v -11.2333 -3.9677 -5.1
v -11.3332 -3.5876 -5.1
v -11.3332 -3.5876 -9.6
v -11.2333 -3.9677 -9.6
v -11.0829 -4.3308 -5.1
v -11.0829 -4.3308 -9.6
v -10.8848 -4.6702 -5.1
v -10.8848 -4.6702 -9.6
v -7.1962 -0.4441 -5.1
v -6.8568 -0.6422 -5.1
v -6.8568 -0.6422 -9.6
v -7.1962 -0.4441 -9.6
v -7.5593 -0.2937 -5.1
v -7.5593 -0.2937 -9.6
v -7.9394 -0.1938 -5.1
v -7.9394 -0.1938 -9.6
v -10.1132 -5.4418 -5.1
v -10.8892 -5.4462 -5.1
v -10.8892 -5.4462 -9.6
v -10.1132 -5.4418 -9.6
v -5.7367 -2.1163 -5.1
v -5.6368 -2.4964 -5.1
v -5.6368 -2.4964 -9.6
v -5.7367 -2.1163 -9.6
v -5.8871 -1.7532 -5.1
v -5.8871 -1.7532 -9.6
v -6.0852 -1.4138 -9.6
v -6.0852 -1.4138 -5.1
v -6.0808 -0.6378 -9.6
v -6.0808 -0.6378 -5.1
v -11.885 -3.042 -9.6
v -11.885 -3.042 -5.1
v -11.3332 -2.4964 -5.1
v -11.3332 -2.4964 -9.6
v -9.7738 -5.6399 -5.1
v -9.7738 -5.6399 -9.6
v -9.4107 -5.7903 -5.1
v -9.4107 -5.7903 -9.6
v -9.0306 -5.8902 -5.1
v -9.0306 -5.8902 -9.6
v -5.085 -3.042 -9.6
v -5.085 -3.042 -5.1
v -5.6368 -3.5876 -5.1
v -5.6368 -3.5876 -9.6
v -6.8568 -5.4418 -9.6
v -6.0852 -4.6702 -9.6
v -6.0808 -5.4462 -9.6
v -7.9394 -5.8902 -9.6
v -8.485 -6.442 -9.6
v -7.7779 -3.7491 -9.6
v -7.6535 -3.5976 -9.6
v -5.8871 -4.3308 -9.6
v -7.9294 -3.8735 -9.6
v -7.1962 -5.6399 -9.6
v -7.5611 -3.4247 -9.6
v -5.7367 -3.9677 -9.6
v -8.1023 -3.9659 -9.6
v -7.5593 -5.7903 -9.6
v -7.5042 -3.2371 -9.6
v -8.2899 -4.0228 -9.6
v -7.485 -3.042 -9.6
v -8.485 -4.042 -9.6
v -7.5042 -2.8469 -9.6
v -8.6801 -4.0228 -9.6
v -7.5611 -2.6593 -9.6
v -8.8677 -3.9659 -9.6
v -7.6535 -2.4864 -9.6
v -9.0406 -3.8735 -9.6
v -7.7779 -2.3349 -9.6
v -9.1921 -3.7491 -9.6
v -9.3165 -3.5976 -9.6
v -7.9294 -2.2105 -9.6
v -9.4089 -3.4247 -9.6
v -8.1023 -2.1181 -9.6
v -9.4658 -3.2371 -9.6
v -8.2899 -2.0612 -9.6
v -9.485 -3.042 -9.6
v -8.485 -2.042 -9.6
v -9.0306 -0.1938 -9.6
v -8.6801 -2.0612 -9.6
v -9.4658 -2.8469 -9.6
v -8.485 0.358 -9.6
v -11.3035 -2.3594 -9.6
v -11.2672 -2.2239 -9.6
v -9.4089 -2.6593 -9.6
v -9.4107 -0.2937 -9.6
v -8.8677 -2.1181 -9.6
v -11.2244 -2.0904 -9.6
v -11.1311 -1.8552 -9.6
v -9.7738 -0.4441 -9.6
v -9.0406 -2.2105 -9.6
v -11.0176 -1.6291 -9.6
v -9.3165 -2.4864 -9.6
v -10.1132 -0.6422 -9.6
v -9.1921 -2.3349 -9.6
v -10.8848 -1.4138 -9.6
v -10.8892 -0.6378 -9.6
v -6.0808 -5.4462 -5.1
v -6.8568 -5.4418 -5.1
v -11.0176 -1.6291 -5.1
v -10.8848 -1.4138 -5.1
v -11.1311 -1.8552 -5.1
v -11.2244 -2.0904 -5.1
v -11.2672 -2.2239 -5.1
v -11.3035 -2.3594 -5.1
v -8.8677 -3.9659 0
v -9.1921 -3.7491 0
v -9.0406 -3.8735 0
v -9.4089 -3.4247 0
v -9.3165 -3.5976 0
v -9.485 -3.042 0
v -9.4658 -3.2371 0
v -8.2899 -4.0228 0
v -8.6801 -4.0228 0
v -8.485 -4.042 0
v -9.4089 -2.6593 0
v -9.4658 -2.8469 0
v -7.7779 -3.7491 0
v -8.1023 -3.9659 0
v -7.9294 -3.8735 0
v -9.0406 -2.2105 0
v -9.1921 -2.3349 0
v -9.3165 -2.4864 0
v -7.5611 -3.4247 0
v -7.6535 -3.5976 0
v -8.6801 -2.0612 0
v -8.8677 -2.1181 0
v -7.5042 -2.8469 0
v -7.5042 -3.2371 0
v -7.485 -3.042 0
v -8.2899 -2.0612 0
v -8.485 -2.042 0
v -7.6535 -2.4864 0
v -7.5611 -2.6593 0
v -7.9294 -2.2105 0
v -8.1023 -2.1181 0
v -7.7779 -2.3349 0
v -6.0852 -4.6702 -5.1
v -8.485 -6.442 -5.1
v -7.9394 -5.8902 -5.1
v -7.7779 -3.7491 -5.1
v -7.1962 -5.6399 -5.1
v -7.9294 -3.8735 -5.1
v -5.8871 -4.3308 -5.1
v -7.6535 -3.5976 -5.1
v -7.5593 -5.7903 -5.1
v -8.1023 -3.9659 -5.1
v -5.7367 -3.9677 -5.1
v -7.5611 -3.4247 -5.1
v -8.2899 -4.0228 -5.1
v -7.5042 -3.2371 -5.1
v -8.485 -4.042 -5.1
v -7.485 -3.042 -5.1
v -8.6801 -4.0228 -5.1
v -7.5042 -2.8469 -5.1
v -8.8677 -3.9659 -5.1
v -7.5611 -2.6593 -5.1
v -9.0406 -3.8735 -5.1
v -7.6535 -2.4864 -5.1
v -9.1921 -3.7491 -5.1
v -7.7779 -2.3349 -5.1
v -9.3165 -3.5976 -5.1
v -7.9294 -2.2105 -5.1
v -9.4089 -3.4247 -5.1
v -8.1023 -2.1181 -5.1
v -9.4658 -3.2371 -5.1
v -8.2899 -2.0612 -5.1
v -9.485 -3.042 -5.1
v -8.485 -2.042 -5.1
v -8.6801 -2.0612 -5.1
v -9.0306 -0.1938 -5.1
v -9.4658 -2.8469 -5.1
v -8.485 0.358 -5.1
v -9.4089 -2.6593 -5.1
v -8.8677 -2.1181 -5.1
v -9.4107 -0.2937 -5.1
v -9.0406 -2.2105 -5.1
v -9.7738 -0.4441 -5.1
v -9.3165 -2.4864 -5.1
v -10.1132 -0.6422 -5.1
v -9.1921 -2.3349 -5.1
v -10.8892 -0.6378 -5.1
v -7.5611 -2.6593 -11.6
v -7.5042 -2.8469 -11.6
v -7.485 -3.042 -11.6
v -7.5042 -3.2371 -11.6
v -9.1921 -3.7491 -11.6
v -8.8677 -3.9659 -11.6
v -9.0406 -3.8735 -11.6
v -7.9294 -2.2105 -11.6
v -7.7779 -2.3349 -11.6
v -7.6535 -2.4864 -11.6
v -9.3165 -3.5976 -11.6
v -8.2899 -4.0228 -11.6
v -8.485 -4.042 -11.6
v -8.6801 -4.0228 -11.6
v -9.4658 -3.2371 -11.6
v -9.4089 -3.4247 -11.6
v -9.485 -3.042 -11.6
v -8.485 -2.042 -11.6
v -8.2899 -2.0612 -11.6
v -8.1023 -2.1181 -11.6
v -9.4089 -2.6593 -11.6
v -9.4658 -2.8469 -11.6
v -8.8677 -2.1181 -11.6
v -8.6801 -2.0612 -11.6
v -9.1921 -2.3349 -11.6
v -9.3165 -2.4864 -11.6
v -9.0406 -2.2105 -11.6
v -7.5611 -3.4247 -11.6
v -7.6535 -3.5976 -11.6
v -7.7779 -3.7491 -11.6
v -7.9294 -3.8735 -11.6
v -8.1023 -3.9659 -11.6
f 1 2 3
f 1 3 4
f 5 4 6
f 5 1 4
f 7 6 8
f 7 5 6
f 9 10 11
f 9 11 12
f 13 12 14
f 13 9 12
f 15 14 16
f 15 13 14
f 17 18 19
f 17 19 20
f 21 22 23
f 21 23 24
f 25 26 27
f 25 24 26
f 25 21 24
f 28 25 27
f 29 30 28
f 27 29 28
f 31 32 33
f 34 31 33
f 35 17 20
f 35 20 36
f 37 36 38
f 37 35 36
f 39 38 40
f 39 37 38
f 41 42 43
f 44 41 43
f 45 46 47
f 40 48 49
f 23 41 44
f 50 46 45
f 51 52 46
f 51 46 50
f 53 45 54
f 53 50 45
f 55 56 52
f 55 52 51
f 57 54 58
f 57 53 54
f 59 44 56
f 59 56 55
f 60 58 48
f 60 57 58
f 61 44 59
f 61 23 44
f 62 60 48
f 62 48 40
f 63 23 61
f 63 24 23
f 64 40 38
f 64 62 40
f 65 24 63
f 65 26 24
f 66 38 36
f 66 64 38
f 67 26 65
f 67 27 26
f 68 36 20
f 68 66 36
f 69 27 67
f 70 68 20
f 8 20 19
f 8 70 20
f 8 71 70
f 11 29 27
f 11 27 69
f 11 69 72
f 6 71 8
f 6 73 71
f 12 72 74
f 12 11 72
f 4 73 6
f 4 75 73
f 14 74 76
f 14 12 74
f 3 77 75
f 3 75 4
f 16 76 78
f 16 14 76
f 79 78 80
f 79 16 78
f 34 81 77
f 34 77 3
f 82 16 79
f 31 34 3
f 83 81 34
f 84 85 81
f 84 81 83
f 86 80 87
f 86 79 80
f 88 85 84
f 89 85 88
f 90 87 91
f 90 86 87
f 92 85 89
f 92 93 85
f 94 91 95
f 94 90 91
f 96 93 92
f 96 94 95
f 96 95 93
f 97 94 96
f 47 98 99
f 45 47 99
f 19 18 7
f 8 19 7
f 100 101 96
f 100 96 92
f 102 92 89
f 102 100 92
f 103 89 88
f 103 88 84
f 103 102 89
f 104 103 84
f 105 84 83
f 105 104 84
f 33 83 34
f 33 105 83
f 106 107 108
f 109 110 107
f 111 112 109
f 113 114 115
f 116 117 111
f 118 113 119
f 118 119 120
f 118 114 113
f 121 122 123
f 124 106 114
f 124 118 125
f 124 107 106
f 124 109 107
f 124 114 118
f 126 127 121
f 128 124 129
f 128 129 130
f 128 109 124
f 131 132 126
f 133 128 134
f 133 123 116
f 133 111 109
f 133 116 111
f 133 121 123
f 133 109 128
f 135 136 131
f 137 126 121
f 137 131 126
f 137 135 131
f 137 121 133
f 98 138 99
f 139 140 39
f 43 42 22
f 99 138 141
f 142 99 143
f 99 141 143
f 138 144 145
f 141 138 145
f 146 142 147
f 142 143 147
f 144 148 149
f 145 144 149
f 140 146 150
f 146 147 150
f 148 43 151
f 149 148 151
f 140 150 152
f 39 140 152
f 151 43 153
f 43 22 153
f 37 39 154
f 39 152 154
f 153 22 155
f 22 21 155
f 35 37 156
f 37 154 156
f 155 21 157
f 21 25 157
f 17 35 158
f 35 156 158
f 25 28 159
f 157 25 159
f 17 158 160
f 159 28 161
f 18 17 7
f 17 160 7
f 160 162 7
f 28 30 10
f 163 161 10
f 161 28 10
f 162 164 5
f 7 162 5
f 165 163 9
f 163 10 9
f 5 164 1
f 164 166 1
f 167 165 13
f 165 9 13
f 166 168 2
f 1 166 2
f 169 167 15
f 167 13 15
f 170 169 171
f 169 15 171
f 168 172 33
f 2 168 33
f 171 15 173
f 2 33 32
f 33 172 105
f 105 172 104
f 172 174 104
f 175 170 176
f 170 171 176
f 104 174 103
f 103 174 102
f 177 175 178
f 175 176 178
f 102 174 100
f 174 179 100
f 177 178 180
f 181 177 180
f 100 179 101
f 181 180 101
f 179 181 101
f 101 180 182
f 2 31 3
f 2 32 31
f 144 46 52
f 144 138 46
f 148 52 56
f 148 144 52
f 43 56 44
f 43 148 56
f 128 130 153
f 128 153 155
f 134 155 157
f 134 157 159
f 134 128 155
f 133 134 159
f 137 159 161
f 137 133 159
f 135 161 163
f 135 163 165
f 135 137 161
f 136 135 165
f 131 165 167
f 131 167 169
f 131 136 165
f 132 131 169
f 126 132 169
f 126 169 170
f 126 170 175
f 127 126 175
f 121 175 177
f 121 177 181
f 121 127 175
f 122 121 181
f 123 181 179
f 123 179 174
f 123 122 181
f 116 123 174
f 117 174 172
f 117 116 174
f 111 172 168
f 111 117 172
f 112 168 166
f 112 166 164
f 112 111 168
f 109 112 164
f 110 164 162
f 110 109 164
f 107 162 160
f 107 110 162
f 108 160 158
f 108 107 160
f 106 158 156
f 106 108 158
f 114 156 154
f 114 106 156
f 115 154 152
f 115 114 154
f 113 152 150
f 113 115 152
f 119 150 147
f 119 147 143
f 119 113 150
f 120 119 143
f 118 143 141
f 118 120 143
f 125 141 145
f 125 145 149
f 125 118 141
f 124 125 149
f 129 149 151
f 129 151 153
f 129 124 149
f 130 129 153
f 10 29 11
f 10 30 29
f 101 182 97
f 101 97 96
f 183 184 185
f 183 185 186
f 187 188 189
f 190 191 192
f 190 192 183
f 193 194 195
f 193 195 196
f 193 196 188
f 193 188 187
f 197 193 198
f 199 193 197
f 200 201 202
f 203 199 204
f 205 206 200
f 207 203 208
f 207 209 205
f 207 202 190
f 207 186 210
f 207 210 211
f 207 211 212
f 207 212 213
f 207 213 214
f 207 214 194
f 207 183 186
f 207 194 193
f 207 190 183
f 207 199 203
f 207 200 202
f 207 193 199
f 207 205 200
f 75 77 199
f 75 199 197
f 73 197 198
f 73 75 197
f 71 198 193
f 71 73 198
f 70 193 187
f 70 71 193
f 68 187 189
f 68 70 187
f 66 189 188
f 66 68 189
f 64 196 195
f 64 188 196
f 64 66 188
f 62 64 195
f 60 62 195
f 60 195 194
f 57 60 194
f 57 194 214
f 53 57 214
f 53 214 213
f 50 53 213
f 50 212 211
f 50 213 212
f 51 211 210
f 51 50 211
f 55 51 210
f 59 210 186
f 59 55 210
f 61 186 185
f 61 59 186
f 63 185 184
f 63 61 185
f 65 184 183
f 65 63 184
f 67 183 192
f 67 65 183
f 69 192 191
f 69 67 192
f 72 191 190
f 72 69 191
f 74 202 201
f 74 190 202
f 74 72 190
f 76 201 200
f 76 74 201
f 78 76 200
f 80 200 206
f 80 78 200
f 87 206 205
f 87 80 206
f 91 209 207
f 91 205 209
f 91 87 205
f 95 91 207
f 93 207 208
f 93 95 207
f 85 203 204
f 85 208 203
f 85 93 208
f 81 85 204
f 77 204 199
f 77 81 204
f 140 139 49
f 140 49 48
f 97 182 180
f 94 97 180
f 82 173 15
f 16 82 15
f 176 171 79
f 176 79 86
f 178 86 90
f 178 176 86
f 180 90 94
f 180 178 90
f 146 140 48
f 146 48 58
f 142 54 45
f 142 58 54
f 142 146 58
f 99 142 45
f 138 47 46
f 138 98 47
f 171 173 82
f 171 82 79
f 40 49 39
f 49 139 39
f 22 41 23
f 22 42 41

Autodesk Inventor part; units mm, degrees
ref_plane "YZ Plane" through (0, 0, 0) normal (1, 0, 0) x (0, 1, 0)
ref_plane "XZ Plane" through (0, 0, 0) normal (0, 1, 0) x (-1, 0, 0)
ref_plane "XY Plane" through (0, 0, 0) normal (0, 0, 1) x (1, 0, 0)
sketch "Sketch1" plane through (0, 0, 0) normal (0, 0, 1) x (1, 0, 0)
  circle A0 centre (-8.485, -3.042) radius 1.1 projected
  line L0 (-21.0171, 3.396) -> (-20.9715, -5.8039) projected
  line L1 (-19.9666, -6.7989) -> (3.0331, -6.6851) projected
  line L2 (4.0282, -5.6801) -> (3.9826, 3.5198) projected
  circle A1 centre (0, 0) radius 3 projected
  circle A2 centre (-16.9998, -0.0841) radius 3 projected
  circle A3 centre (-8.485, -3.042) radius 1
  line L3 (2.9777, 4.5148) -> (-20.022, 4.401) projected
  arc A4 (-20.9715, -5.8039) -> (-19.9666, -6.7989) centre (-19.9715, -5.7989) ccw projected
  arc A5 (3.0331, -6.6851) -> (4.0282, -5.6801) centre (3.0282, -5.6851) ccw projected
  arc A6 (3.9826, 3.5198) -> (2.9777, 4.5148) centre (2.9826, 3.5148) ccw projected
  arc A7 (-20.022, 4.401) -> (-21.0171, 3.396) centre (-20.0171, 3.401) ccw projected
  point P0 (0, 0)
  dimension "d0" = 2
extrude "Extrusion1" add sketch "Sketch1" against normal blind 5.1 contours A3
sketch "Sketch2" plane through (-8.485, -3.042, -5.1) normal (0, 0, -1) x (-1, 0, 0)
  circle A0 centre (0, 0) radius 1.1 projected
  line L0 (12.5394, 7.938) -> (12.4815, -3.7618) projected
  line L1 (12.4815, -3.7618) -> (-12.5182, -3.6381) projected
  line L2 (-12.5182, -3.6381) -> (-12.4603, 8.0618) projected
  line L3 (-12.4603, 8.0618) -> (12.5394, 7.938) projected
  circle A1 centre (-8.485, 3.042) radius 3 projected
  circle A2 centre (8.5147, 2.9579) radius 3 projected
  line L4 (-0.0183, -3.7) -> (-0.0183, -4.9)
  circle A3 centre (0, 0) radius 4.9
  line L5 (-0.0183, -4.9) -> (-0.0183, -2.9)
  circle A4 centre (0, 0) radius 2.9
  line L6 (0, 2.9) -> (0, 3.4)
  line L7 (0, 3.4) -> (0.5456, 2.8482)
  line L8 (0, 3.4) -> (-0.5456, 2.8482)
  line L9 (-2.4042, 2.4042) -> (-1.6282, 2.3998)
  line L10 (-2.4042, 2.4042) -> (-2.3998, 1.6282)
  line L11 (-3.4, 0) -> (-2.8482, 0.5456)
  line L12 (-3.4, 0) -> (-2.8482, -0.5456)
  line L13 (-2.4042, -2.4042) -> (-2.3998, -1.6282)
  line L14 (-2.4042, -2.4042) -> (-1.6282, -2.3998)
  line L15 (0, -3.4) -> (-0.5456, -2.8482)
  line L16 (0, -3.4) -> (0.5456, -2.8482)
  line L17 (2.4042, -2.4042) -> (1.6282, -2.3998)
  line L18 (2.4042, -2.4042) -> (2.3998, -1.6282)
  line L19 (3.4, 0) -> (2.8482, -0.5456)
  line L20 (3.4, 0) -> (2.8482, 0.5456)
  line L21 (2.4042, 2.4042) -> (2.3998, 1.6282)
  line L22 (2.4042, 2.4042) -> (1.6282, 2.3998)
  line L23 (8.5147, 2.9579) -> (0, 0)
  point P0 (-8.485, 3.042)
  point P1 (2.3998, 1.6282)
  point P2 (-1.6282, 2.3998)
  point P3 (-2.3998, 1.6282)
  point P4 (-2.8482, 0.5456)
  point P5 (-2.8482, -0.5456)
  point P6 (-2.3998, -1.6282)
  point P7 (-1.6282, -2.3998)
  point P8 (-0.5456, -2.8482)
  point P9 (0.5456, -2.8482)
  point P10 (1.6282, -2.3998)
  point P11 (2.8482, -0.5456)
  point P12 (2.8482, 0.5456)
  dimension "d3" = 1.2
  dimension "d4" = 2
  dimension "d5" = 0.5
  dimension "d8" = 360
extrude "Extrusion2" add sketch "Sketch2" along normal blind 4.5 contours A0 | A4 | L20 L19 A4 | A4 L22 L21 | A4 L6 L7 | L18 L17 A4 | A4 L8 L6 | L15 A4 L5 | L5 A4 L16 L15 | A4 L10 L9 | L14 L13 A4 | A4 L12 L11
sketch "Sketch3" plane through (-8.485, -3.042, -9.6) normal (0, 0, -1) x (-1, 0, 0)
  circle A0 centre (0, 0) radius 1 projected
  point P0 (-8.485, 3.042)
extrude "Extrusion3" add sketch "Sketch3" along normal blind 2
properties part number "kolo"
